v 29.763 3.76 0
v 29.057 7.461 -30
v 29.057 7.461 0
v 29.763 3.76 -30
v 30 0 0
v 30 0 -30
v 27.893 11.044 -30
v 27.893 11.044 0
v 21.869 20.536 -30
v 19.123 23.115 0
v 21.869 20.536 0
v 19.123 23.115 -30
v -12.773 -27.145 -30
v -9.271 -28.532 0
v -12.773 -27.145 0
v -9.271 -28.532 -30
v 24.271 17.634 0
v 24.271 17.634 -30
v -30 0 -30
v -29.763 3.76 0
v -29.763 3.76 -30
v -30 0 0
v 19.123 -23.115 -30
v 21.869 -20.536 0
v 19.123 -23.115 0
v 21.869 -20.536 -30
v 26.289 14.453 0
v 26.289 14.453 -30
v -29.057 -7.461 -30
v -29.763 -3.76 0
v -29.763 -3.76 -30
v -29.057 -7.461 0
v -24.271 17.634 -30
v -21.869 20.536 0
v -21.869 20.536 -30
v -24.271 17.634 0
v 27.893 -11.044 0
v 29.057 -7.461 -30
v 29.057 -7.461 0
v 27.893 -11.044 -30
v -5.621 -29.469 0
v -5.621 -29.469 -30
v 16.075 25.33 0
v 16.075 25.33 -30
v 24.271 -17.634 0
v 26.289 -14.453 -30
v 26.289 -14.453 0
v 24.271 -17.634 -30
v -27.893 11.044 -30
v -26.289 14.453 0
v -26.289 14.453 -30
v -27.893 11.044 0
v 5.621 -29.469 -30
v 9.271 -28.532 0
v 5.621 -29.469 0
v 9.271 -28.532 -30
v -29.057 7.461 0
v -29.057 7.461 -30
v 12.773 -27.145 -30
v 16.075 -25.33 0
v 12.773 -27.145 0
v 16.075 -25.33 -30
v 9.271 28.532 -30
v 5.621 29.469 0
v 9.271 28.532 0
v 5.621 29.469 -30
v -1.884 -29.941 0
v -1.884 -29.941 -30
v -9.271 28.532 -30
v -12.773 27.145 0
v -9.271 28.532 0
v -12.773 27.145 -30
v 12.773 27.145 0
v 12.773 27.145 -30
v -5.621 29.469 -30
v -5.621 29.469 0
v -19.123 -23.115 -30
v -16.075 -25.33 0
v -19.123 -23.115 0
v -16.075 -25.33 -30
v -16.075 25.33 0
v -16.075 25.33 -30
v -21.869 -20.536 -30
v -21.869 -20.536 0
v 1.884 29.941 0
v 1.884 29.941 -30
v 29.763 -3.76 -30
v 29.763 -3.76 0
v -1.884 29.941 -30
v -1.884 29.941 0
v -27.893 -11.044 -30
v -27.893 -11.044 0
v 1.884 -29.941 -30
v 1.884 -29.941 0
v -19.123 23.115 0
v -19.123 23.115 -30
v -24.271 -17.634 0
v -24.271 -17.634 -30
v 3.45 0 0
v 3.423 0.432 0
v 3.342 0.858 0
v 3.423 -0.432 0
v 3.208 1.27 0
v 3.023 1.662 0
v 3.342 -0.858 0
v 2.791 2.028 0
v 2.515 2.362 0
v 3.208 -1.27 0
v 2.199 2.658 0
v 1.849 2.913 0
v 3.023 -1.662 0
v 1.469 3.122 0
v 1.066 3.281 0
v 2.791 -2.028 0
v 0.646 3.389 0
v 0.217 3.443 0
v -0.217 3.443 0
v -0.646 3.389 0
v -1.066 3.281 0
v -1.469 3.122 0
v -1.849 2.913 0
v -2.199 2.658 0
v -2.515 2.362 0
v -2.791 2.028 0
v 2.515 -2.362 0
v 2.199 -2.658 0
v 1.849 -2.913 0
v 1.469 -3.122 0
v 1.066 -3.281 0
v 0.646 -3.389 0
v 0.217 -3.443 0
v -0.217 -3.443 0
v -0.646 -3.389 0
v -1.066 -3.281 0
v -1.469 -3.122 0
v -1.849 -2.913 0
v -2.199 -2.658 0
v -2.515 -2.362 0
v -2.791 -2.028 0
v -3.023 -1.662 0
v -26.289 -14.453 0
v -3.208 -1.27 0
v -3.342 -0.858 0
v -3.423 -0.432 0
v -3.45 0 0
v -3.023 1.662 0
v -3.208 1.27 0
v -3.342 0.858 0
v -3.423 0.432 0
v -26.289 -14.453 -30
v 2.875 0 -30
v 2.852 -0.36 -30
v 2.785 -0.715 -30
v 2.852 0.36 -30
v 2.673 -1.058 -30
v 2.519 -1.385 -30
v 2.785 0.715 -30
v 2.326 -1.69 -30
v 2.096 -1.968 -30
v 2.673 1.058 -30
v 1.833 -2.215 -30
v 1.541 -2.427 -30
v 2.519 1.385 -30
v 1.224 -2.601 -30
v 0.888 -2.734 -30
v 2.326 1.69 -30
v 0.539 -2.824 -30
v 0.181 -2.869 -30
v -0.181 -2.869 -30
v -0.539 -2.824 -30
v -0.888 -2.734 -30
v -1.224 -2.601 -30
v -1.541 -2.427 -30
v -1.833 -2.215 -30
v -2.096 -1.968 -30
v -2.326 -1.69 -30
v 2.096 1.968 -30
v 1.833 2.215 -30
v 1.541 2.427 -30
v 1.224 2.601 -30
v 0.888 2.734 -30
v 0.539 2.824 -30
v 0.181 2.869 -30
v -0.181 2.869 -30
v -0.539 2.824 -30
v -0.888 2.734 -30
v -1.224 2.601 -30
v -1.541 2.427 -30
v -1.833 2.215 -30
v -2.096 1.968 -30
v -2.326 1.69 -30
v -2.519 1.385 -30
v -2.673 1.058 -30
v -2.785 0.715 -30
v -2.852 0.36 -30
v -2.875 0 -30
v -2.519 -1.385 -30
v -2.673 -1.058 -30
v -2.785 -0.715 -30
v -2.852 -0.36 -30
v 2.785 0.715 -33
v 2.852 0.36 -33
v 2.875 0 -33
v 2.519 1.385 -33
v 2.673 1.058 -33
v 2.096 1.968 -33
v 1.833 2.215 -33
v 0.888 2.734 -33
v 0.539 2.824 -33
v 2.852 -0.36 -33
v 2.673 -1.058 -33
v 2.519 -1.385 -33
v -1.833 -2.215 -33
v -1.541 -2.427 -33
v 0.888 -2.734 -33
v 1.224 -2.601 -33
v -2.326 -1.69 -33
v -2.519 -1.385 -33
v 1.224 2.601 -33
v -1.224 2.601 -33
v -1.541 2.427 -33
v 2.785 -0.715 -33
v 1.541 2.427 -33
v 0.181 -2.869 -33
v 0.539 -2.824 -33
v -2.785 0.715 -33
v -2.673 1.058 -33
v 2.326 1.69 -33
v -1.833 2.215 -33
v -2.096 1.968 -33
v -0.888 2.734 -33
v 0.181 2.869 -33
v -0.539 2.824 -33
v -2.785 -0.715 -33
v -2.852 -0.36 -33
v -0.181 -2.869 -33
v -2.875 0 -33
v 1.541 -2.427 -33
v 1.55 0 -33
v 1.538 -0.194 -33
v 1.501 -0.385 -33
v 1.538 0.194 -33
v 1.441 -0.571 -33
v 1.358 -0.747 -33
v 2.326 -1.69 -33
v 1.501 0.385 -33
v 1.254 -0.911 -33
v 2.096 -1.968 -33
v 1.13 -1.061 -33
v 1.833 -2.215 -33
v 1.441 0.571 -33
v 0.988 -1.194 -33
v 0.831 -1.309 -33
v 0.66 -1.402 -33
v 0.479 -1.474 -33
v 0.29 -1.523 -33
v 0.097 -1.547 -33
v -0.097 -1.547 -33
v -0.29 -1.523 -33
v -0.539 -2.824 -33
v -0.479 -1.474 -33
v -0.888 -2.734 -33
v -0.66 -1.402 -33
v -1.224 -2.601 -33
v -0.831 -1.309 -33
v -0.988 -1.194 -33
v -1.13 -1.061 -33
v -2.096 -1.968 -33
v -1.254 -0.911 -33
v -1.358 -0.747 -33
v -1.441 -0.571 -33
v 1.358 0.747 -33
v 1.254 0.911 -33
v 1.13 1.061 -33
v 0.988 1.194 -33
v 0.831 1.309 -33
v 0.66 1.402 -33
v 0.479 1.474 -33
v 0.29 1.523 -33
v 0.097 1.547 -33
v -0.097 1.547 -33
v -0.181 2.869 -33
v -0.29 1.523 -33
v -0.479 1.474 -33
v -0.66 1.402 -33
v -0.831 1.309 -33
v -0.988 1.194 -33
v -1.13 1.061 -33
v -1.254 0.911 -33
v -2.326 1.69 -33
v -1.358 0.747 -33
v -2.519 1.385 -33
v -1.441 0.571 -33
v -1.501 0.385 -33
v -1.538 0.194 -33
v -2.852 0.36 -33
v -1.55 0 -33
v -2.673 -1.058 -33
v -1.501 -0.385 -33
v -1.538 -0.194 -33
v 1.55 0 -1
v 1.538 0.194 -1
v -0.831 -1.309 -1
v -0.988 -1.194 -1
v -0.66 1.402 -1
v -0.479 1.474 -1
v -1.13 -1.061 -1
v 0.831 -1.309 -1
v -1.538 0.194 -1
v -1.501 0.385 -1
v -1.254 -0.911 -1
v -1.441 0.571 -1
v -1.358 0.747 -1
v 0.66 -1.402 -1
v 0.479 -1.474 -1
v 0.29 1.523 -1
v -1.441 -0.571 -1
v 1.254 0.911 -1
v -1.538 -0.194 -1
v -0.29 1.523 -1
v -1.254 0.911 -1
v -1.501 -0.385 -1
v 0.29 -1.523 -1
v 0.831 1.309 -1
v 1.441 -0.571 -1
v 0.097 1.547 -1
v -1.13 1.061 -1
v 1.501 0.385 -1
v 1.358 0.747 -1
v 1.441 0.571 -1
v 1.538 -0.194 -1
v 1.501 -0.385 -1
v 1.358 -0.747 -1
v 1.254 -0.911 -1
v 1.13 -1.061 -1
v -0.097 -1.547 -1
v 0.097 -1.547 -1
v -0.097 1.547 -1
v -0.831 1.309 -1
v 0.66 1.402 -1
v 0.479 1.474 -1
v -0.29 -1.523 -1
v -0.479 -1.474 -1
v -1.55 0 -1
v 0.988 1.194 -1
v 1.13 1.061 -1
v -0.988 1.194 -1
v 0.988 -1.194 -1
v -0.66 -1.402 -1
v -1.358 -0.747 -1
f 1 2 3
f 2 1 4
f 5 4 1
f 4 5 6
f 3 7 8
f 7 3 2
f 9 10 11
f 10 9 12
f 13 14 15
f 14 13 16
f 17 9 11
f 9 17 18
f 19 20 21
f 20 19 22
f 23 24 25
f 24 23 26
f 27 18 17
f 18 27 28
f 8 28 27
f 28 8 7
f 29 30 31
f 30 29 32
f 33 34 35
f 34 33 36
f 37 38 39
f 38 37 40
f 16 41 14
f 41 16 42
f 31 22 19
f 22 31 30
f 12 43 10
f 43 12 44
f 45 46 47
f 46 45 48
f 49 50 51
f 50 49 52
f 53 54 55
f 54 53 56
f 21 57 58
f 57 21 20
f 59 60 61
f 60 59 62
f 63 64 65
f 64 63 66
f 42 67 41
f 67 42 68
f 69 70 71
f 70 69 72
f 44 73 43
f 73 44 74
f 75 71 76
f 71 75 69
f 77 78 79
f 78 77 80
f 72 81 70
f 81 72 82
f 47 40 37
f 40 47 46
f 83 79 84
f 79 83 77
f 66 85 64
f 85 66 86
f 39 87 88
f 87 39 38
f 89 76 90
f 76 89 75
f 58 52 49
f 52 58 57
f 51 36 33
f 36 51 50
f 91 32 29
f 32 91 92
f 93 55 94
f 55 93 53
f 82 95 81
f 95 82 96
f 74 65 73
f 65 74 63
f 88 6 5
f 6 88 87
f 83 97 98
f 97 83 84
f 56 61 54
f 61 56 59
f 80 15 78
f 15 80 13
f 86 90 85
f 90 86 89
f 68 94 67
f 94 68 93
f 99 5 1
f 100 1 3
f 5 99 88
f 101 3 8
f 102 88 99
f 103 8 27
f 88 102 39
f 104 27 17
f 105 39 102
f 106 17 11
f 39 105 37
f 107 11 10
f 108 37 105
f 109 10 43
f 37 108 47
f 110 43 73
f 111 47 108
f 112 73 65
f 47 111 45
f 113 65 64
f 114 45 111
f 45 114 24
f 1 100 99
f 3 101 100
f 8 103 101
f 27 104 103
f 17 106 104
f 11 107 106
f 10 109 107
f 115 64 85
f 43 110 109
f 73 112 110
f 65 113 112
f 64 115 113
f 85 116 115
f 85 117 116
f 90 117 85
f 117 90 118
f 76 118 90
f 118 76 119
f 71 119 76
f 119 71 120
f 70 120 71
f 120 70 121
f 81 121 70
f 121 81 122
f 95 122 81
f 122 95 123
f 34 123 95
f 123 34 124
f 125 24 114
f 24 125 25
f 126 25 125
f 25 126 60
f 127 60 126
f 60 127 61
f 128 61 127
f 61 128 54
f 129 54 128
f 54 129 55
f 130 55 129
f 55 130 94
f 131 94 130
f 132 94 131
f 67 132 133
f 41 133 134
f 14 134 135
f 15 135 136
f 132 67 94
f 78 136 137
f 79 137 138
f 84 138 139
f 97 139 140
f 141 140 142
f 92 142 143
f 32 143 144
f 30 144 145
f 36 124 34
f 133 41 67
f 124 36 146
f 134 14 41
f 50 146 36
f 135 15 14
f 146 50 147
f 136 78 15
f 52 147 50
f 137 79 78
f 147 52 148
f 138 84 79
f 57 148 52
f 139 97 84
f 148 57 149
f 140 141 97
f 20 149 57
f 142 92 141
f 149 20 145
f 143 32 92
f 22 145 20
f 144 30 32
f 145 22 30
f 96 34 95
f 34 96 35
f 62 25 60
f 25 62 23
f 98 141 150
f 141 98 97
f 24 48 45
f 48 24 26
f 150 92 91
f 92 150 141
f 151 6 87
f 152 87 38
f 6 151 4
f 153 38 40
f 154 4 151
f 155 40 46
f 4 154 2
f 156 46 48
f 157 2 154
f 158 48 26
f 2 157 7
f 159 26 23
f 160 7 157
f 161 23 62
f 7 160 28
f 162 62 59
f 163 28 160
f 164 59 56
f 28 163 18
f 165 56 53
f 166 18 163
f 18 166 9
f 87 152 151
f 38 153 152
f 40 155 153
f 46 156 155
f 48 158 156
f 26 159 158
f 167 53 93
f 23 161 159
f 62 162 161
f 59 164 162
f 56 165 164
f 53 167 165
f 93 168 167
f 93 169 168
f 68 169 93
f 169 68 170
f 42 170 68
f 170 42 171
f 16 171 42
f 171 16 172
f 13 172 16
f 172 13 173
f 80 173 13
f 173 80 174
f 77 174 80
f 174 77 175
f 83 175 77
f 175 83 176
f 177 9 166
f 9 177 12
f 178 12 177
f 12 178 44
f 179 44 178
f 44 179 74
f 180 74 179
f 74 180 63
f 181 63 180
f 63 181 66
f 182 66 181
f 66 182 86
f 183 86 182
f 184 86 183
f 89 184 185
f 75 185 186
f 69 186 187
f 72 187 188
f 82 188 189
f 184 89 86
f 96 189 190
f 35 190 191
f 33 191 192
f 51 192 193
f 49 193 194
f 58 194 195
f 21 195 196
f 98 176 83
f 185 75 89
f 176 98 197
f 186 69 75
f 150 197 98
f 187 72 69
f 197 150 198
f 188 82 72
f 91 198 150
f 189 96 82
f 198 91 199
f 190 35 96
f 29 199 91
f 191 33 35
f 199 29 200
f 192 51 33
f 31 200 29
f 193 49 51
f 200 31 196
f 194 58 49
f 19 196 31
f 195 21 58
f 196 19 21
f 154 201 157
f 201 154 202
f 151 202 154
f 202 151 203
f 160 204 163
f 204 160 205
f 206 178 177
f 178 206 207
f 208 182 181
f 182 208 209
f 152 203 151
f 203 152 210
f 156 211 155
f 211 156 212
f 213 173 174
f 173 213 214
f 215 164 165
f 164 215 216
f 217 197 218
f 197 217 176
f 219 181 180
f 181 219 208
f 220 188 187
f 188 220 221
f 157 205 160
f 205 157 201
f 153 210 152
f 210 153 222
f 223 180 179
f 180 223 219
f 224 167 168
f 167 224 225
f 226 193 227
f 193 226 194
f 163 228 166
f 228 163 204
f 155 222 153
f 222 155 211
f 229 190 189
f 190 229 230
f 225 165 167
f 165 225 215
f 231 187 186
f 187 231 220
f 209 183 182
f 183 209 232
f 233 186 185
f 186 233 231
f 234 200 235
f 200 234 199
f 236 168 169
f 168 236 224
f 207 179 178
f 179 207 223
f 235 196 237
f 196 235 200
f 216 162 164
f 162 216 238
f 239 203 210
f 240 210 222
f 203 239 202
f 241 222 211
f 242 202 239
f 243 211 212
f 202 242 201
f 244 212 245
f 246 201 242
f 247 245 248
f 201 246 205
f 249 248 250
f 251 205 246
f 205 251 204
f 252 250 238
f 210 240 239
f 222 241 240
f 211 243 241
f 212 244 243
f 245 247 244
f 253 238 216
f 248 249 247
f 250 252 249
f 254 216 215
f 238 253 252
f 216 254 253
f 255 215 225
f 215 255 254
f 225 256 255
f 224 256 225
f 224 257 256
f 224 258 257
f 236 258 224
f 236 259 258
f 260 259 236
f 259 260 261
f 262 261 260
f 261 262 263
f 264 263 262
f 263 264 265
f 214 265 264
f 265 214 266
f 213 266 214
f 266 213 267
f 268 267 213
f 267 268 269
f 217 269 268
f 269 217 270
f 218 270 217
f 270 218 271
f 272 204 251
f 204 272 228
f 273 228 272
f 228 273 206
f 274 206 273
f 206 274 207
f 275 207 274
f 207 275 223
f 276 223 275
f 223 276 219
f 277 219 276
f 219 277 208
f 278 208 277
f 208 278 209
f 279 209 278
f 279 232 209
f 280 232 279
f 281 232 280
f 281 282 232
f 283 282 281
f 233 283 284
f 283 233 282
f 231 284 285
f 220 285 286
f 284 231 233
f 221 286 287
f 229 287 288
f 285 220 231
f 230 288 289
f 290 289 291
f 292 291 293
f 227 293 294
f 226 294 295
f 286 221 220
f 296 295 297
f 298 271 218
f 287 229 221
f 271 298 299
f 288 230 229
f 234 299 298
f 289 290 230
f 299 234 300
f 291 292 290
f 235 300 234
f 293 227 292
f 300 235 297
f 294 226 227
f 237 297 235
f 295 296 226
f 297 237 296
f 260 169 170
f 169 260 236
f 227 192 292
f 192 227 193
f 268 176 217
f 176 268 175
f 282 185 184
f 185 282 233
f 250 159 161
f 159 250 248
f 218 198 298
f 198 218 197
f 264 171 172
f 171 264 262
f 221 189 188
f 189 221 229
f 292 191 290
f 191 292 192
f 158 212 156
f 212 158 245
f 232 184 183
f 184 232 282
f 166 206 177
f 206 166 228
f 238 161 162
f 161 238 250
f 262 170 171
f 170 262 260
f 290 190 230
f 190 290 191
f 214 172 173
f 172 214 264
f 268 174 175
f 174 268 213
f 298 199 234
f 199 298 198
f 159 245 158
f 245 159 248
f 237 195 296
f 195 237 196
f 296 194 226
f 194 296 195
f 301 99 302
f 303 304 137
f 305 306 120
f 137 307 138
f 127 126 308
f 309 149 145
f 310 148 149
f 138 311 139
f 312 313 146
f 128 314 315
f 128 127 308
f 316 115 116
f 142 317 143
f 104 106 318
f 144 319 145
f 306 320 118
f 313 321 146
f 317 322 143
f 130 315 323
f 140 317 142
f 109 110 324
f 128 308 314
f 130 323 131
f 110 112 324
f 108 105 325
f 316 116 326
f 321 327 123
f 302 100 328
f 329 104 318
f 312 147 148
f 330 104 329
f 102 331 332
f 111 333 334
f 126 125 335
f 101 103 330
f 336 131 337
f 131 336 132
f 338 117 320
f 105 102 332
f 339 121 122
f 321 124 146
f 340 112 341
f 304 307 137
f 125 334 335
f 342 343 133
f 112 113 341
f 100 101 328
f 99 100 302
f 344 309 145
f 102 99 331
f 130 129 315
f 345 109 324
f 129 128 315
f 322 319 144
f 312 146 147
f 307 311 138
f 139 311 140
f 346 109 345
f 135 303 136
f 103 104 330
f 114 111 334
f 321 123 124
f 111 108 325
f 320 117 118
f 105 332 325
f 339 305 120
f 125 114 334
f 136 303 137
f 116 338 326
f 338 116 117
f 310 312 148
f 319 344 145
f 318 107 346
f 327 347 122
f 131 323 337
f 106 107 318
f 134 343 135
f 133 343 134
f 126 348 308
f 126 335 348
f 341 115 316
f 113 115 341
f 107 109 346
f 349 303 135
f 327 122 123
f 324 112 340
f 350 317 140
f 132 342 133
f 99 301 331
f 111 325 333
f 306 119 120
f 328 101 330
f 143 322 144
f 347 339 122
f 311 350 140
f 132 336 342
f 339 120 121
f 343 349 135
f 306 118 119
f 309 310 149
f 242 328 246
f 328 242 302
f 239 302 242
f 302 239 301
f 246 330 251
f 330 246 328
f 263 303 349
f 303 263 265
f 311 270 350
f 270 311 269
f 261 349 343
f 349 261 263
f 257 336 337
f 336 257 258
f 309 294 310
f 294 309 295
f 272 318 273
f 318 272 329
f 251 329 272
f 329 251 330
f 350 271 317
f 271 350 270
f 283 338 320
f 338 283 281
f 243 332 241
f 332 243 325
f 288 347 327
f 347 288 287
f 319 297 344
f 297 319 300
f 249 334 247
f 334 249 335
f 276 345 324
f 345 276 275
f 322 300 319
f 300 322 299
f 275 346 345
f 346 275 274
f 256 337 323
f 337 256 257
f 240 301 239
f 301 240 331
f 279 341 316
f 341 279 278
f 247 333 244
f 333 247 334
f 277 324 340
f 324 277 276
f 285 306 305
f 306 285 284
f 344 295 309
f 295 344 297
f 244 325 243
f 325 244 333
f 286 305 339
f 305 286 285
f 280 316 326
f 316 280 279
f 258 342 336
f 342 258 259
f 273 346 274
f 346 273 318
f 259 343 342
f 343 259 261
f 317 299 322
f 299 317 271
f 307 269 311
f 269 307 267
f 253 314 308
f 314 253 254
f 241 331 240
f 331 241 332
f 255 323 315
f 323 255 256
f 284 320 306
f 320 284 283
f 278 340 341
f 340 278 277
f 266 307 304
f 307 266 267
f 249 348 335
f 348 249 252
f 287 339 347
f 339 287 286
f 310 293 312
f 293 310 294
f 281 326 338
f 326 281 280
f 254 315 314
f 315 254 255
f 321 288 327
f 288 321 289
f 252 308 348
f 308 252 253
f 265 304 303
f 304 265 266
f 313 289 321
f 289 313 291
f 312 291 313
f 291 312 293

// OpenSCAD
$fn = 50;

difference() {
	union() {
		translate(v = [0, 0, -30.0]) {
			cylinder(h = 30, r = 30.0);
		}
		#translate(v = [0, 0, -33.0]) {
			cylinder(h = 33, r = 2.875);
		}
	}
	union() {
		translate(v = [0, 0, 0]) {
			rotate(a = [0, 0, 0]) {
				difference() {
					union() {
						translate(v = [0, 0, -33.0]) {
							cylinder(h = 33, r = 1.25);
						}
						translate(v = [0, 0, -1.0]) {
							cylinder(h = 1.0, r1 = 1.55, r2 = 3.45);
						}
						translate(v = [0, 0, -33.0]) {
							cylinder(h = 33, r = 1.55);
						}
						translate(v = [0, 0, -33.0]) {
							cylinder(h = 33, r = 1.25);
						}
					}
					union();
				}
			}
		}
	}
}
